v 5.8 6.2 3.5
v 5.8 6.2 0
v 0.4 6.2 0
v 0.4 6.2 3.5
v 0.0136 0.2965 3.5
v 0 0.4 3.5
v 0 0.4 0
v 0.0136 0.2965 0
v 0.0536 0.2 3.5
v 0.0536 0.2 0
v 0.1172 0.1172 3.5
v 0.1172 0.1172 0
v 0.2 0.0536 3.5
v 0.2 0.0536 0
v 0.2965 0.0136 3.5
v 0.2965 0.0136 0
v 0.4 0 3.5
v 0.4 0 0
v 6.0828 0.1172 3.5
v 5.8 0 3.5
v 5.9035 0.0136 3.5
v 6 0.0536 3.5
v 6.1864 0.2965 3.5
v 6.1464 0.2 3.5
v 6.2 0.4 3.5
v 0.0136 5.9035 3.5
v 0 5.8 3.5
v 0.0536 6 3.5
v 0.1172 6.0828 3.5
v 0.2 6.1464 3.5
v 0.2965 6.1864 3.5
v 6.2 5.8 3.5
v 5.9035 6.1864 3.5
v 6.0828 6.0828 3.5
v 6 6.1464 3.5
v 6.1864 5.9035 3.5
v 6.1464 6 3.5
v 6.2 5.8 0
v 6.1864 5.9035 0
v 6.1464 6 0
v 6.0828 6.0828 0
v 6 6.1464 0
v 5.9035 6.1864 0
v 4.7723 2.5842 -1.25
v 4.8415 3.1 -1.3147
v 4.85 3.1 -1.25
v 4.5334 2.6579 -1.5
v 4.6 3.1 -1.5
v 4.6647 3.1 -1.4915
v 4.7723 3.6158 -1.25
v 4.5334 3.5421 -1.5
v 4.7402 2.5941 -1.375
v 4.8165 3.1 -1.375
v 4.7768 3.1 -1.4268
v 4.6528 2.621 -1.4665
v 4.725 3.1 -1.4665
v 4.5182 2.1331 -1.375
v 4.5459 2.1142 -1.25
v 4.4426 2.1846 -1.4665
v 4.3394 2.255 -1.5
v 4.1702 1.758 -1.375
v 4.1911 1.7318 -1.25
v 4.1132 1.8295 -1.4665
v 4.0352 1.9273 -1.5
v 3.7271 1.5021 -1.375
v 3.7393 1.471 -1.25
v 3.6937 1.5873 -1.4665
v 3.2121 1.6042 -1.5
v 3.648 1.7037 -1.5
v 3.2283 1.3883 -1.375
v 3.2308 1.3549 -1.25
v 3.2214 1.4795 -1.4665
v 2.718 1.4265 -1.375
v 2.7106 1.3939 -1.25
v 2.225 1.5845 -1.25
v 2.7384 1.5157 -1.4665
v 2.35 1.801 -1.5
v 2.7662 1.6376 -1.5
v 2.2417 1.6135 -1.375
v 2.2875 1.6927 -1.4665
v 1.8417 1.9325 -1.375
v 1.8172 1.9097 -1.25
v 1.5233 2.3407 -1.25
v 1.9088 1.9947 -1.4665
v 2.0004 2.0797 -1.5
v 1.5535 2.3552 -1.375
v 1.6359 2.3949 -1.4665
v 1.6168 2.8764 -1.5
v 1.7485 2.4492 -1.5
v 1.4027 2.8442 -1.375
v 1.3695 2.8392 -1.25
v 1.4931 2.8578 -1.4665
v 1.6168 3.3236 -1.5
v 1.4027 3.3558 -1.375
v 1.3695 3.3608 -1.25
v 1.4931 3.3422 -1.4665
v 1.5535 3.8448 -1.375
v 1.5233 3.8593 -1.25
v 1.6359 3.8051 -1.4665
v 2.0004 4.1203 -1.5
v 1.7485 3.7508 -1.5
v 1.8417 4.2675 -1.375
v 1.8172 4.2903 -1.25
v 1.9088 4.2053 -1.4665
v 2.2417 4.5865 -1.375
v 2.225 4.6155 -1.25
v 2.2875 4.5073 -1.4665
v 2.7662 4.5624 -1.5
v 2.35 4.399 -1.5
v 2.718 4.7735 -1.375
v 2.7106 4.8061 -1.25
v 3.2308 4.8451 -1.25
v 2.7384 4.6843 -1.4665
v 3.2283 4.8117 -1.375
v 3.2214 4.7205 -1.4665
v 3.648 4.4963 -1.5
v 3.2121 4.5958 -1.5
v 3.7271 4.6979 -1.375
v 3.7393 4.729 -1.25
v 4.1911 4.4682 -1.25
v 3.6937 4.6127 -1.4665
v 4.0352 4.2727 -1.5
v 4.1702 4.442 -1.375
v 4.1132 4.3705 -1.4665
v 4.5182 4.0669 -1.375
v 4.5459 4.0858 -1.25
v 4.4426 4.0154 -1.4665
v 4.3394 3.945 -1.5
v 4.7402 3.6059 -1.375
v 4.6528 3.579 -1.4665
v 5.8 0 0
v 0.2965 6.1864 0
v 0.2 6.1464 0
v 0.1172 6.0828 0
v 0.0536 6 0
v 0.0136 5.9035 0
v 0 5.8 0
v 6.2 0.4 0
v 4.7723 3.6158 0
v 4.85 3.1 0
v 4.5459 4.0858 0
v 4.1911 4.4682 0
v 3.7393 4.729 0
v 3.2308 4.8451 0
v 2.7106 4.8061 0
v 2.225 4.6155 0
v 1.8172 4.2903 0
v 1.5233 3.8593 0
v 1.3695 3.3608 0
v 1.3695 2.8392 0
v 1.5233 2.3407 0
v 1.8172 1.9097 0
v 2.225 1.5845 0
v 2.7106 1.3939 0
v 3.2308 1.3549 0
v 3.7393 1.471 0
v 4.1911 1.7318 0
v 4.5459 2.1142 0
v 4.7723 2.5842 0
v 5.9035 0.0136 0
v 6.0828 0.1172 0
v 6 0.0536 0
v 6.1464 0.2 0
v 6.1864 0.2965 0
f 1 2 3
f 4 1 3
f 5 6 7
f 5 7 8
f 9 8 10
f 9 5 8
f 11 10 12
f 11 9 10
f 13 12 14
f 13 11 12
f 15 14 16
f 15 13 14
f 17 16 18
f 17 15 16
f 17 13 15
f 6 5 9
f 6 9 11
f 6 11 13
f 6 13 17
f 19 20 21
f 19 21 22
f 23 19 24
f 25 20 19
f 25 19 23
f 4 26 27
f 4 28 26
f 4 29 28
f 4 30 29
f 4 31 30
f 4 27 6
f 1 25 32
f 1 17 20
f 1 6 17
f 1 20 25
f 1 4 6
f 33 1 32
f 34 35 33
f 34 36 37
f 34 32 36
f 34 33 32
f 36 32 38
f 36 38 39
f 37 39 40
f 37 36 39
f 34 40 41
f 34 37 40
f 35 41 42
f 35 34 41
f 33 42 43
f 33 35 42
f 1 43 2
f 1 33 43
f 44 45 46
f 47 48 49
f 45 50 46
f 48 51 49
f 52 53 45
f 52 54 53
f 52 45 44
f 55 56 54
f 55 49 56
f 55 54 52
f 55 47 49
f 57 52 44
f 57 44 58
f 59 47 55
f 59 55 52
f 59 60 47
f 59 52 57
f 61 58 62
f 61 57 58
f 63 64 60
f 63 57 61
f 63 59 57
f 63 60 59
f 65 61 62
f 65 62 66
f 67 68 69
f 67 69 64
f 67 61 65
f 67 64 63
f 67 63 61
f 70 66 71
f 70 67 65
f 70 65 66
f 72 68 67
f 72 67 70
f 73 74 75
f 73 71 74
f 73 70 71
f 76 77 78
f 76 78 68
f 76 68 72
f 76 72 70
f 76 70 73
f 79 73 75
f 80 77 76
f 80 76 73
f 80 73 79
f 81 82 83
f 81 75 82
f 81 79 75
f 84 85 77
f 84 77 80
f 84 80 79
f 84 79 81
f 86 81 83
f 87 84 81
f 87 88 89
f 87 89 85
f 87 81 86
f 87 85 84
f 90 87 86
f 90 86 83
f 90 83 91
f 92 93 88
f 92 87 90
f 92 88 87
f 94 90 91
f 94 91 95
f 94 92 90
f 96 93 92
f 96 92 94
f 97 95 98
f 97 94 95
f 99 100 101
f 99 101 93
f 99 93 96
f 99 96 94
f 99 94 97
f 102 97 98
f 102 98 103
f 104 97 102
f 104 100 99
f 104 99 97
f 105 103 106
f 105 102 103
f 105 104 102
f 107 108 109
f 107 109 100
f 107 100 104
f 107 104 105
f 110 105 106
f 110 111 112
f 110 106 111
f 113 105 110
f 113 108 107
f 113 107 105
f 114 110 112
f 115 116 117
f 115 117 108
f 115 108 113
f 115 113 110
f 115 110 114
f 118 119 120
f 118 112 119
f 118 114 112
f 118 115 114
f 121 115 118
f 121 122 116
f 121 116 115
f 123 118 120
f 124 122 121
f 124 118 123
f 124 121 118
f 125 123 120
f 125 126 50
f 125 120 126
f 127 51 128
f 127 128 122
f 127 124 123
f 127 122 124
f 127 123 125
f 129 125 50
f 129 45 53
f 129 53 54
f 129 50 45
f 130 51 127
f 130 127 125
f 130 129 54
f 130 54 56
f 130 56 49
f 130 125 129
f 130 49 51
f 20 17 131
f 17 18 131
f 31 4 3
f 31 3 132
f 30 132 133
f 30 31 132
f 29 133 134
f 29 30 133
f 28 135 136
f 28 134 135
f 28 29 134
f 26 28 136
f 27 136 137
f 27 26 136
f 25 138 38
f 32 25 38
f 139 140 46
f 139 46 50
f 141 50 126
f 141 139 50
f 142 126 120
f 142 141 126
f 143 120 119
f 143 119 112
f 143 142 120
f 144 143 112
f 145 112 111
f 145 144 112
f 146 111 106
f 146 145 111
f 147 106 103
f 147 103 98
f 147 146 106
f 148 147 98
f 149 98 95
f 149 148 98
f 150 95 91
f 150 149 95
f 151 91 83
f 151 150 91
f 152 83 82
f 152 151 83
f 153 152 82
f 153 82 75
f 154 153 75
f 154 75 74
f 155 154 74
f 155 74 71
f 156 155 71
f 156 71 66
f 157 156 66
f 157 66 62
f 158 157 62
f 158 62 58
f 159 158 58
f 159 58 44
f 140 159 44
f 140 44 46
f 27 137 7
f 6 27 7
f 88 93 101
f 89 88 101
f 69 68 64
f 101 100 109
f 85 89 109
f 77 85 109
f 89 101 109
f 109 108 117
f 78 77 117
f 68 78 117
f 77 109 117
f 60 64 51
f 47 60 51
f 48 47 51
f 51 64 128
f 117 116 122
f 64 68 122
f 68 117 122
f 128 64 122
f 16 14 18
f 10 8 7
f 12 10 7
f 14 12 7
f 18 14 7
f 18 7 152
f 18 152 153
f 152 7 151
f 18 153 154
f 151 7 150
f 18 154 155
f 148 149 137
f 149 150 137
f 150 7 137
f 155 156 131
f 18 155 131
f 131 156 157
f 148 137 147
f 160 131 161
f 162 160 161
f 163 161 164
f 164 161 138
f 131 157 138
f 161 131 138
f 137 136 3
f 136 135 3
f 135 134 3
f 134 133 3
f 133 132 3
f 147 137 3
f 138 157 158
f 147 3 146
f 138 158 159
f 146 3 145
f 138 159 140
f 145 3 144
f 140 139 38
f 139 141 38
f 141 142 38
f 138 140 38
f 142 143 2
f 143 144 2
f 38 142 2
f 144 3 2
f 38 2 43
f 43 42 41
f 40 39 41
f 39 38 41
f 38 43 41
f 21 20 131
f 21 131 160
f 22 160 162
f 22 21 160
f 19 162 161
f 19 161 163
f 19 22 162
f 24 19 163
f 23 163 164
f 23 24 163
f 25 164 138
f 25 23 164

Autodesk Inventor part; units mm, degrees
ref_plane "YZ Plane" through (0, 0, 0) normal (1, 0, 0) x (0, 1, 0)
ref_plane "XZ Plane" through (0, 0, 0) normal (0, 1, 0) x (-1, 0, 0)
ref_plane "XY Plane" through (0, 0, 0) normal (0, 0, 1) x (1, 0, 0)
sketch "Sketch1" plane through (0, 0, 0) normal (0, 0, 1) x (1, 0, 0)
  line L0 (0, 0) -> (6.2, 0)
  line L1 (6.2, 0) -> (6.2, 6.2)
  line L2 (6.2, 6.2) -> (0, 6.2)
  line L3 (0, 6.2) -> (0, 0)
  line L4 (0, 6.2) -> (6.2, 0) construction
  line L5 (6.2, 6.2) -> (0, 0) construction
  circle A0 centre (3.1, 3.1) radius 1.75
  dimension "d0" = 6.2
  dimension "d1" = 6.2
  dimension "d2" = 3.5
extrude "Extrusion1" add sketch "Sketch1" along normal blind 3.5 contours L3 L2 L1 L0 | A0
extrude "Extrusion2" add sketch "Sketch1" against normal blind 1.5 contours A0
fillet "Fillet1" radius 0.4 4 edges at (0, 6.2, 1.75) (0, 0, 1.75) (6.2, 0, 1.75) (6.2, 6.2, 1.75)
fillet "Fillet2" radius 0.25 1 edges at (1.35, 3.1, -1.5)
properties part number "Button"
